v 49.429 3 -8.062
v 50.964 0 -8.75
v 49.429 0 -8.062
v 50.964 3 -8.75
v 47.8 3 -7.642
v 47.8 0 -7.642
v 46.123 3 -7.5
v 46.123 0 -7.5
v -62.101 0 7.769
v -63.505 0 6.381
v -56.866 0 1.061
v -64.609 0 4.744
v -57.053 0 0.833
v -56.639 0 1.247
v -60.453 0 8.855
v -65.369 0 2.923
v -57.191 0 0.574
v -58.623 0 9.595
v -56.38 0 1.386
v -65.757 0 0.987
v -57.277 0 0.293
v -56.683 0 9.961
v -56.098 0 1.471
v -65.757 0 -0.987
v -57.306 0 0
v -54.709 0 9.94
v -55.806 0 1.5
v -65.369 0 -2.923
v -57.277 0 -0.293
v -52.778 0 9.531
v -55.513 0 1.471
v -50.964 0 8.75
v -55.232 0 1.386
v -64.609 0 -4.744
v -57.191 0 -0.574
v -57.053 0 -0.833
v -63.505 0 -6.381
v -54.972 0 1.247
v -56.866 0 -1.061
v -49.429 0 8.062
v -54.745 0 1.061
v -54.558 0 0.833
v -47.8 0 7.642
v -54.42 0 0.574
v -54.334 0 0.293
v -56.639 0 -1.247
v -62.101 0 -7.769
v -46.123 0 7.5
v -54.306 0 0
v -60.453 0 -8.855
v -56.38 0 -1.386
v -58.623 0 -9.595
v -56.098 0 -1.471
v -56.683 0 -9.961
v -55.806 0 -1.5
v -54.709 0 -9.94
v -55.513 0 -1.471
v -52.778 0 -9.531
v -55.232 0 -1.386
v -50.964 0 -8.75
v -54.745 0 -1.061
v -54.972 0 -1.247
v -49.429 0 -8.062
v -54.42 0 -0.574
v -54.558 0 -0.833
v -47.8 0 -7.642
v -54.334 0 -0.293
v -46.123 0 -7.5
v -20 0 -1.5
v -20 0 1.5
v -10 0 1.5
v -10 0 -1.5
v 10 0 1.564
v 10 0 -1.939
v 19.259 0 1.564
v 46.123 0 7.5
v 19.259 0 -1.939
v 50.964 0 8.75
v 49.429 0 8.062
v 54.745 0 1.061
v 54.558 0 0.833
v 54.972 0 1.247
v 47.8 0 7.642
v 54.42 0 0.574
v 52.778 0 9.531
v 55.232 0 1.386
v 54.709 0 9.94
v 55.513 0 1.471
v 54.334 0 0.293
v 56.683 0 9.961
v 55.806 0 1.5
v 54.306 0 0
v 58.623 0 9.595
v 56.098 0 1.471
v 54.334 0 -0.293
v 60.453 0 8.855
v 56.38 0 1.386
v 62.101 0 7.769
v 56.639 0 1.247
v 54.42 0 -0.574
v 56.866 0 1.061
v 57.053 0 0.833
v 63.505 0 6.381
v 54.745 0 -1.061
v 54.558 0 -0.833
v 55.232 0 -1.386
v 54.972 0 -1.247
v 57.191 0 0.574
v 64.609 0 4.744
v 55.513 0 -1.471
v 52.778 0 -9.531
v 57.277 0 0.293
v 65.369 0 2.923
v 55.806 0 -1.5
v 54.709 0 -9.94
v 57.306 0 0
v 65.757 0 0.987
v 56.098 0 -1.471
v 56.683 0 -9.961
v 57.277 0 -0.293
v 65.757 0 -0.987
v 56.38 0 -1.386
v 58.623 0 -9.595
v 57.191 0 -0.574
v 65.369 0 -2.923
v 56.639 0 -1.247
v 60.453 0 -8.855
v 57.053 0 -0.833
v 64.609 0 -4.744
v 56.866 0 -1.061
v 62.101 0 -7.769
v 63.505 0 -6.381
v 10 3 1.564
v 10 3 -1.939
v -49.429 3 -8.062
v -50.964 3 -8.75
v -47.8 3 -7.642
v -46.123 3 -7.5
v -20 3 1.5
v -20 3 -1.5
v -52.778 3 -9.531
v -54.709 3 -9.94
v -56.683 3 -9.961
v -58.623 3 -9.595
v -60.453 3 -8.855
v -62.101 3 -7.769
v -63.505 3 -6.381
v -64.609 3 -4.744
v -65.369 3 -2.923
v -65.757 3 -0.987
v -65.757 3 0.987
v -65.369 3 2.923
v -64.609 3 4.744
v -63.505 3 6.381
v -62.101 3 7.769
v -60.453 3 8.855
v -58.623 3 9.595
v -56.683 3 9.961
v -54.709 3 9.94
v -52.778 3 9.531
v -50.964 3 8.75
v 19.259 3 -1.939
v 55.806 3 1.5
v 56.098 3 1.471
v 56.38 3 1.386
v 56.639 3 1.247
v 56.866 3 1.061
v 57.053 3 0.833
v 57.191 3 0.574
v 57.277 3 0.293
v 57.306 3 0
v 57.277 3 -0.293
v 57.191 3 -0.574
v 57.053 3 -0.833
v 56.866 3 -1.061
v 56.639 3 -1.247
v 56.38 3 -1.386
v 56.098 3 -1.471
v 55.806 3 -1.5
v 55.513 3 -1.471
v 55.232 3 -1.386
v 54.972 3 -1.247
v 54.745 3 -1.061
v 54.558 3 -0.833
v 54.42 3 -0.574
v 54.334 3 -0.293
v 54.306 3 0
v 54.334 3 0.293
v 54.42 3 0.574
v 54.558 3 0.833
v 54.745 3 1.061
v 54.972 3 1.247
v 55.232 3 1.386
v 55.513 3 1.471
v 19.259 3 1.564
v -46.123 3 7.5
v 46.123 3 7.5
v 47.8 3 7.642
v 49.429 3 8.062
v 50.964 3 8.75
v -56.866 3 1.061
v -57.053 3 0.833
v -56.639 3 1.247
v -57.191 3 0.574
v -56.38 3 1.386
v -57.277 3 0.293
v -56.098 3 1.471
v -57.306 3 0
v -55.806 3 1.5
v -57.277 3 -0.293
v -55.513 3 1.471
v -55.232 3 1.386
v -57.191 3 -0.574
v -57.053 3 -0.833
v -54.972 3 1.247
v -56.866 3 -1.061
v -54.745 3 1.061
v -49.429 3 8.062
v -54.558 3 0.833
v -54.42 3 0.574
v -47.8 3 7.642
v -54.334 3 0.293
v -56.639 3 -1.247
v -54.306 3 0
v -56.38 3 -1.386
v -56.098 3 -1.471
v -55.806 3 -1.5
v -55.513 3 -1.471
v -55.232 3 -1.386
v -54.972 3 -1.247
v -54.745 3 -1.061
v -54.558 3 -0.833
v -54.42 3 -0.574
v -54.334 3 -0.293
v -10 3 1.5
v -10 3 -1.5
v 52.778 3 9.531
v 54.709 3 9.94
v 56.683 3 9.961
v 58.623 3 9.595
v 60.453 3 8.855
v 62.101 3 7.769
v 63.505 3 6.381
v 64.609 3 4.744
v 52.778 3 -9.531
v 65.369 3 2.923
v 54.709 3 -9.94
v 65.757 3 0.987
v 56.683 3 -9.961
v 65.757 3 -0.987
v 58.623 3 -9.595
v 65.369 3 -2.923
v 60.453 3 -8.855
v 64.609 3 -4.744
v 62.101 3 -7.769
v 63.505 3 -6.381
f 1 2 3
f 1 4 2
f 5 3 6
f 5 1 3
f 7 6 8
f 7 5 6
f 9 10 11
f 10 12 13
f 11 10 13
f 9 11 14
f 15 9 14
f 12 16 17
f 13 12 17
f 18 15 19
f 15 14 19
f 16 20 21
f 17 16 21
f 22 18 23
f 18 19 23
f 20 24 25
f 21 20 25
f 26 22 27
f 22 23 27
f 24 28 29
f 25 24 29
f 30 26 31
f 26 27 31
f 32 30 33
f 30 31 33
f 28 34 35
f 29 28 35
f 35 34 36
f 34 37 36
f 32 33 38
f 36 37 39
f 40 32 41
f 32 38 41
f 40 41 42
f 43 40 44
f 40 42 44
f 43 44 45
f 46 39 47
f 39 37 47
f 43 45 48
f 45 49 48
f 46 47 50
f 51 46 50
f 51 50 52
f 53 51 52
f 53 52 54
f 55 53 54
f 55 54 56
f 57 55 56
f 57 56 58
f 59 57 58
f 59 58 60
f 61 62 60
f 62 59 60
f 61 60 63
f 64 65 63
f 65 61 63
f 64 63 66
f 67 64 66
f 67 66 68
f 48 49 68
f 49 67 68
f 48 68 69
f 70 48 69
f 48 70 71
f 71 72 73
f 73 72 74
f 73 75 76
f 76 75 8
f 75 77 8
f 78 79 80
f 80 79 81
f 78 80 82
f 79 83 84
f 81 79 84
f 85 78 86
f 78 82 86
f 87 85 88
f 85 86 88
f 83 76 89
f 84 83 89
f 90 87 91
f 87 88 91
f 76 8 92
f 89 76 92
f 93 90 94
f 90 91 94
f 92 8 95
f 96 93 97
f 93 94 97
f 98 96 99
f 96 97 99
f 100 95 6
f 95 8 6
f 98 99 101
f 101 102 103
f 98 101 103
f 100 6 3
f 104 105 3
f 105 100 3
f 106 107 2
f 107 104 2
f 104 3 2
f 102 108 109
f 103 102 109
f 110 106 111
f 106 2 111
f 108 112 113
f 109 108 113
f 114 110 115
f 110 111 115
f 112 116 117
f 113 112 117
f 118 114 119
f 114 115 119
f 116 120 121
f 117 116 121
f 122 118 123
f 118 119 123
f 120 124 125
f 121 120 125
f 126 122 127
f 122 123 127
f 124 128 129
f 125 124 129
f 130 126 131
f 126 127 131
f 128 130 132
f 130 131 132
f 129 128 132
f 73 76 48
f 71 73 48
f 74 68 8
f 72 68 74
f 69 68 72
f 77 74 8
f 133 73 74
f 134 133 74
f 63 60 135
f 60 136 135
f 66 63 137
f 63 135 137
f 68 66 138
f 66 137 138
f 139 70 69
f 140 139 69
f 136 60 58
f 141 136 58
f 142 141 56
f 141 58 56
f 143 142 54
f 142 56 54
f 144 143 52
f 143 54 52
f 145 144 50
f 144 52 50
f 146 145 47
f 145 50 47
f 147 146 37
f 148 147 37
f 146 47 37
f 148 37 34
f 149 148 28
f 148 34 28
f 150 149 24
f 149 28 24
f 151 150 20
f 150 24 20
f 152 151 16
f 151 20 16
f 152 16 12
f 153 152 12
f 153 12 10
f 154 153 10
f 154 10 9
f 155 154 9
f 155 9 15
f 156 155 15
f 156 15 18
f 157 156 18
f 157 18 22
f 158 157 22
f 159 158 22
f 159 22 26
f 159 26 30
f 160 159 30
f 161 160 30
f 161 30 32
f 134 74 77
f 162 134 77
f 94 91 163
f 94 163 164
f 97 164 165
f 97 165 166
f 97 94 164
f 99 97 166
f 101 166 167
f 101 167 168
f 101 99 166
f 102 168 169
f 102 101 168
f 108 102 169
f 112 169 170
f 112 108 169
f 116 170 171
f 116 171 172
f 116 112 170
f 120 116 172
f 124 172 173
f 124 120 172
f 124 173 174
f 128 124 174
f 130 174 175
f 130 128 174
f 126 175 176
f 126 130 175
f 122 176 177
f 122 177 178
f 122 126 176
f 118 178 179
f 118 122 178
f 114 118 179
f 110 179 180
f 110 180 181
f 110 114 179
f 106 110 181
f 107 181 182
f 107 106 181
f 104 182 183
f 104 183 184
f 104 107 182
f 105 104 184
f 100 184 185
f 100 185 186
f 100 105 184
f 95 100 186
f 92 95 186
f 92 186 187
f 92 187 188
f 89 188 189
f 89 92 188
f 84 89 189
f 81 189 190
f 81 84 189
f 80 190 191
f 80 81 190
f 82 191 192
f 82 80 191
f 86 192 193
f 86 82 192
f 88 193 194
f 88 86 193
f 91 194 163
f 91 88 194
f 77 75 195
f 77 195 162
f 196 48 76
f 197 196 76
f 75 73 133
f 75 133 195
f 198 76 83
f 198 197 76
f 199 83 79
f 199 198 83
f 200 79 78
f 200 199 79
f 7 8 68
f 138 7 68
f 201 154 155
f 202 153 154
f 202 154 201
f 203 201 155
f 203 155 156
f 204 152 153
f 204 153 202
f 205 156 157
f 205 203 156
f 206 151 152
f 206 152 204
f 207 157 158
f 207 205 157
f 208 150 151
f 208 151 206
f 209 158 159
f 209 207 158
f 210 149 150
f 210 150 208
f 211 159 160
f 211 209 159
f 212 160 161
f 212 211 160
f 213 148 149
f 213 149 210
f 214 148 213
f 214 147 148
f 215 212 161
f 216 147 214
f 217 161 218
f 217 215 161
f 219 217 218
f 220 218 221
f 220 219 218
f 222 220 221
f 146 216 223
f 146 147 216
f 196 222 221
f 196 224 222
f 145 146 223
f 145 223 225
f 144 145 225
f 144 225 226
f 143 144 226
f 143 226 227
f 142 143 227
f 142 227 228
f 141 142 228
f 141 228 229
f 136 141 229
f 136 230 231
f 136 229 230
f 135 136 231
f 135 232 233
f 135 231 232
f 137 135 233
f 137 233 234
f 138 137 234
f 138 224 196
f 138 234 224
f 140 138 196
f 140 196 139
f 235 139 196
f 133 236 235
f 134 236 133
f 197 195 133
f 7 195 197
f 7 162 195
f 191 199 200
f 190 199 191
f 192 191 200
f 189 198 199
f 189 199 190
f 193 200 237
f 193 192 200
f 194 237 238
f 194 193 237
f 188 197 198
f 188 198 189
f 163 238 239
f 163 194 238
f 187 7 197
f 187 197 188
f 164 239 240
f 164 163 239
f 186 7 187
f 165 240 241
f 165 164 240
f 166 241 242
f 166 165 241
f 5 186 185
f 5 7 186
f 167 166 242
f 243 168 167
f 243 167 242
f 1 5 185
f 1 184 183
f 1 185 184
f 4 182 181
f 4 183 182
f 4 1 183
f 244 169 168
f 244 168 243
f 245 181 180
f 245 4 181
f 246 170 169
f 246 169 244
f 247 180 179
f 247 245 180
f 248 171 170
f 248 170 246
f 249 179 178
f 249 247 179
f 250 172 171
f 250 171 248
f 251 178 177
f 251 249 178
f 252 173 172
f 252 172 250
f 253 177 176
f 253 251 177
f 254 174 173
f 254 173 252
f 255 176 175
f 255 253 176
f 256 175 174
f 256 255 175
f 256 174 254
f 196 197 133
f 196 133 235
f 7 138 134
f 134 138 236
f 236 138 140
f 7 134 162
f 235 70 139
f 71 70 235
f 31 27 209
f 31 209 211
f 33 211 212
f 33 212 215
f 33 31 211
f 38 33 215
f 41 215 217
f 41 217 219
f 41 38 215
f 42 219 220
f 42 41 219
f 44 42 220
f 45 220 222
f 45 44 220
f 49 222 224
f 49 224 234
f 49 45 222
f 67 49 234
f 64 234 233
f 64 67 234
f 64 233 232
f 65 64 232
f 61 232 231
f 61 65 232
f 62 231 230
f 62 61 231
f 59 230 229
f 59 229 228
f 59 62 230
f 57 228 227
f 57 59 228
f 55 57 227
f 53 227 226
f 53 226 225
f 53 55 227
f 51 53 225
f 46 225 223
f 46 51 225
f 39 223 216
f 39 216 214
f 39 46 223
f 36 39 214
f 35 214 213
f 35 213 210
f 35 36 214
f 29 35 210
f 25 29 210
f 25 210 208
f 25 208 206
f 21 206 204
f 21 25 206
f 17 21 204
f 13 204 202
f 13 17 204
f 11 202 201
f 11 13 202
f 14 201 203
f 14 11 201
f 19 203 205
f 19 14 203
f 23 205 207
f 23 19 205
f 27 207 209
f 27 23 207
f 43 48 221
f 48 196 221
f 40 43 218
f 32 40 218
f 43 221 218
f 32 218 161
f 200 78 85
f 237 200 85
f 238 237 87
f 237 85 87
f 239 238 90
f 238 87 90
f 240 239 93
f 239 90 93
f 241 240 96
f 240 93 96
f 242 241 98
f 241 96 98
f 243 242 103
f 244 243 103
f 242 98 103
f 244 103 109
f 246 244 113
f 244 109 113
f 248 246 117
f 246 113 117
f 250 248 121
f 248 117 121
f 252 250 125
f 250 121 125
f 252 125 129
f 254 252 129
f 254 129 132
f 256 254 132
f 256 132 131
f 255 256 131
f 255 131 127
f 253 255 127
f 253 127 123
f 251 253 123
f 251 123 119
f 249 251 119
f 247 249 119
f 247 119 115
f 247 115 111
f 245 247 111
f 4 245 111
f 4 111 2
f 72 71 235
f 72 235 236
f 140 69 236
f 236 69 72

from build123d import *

# Parameters (mm, degrees)
SKETCH_1_R      = 1.5
SKETCH_1_W      = 10
SKETCH_1_H      = 3
SKETCH_1_W_2    = 9.259227657
SKETCH_1_H_2    = 3.503491546
EXTRUDE_1_DEPTH = 3
FILLET_1_R      = 10


with BuildPart() as part:
    # 草图1 → 凸台-拉伸1 (new body)
    with BuildSketch(Plane(origin=(0, 0, 0), x_dir=(1, 0, 0), z_dir=(0, 1, 0))):
        with BuildLine():
            Line((-49.19123706, -7.5), (49.19123706, -7.5))
            ThreePointArc((49.19123706, -7.5), (65.805615338, 0), (49.19123706, 7.5))
            Line((49.19123706, 7.5), (-49.19123706, 7.5))
            ThreePointArc((-49.19123706, 7.5), (-65.805615338, 0), (-49.19123706, -7.5))
        make_face()
        with Locations(Location((-55.805615338, 0, 0), (0, 0, 270))):
            Circle(SKETCH_1_R, mode=Mode.SUBTRACT)
        with Locations(Location((55.805615338, 0, 0), (0, 0, 270))):
            Circle(SKETCH_1_R, mode=Mode.SUBTRACT)
        with Locations((-15, 0)):
            Rectangle(SKETCH_1_W, SKETCH_1_H, mode=Mode.SUBTRACT)
        with Locations((14.629613829, 0.187687047)):
            Rectangle(SKETCH_1_W_2, SKETCH_1_H_2, mode=Mode.SUBTRACT)
    extrude(amount=EXTRUDE_1_DEPTH)

    # 圆角1
    fillet_1_edges = [part.edges().sort_by_distance(p)[0] for p in [
        (-49.19123706, 1.5, -7.5),
        (49.19123706, 1.5, -7.5),
        (49.19123706, 1.5, 7.5),
        (-49.19123706, 1.5, 7.5),
    ]]
    fillet(fillet_1_edges, radius=FILLET_1_R)


solid = part.part
